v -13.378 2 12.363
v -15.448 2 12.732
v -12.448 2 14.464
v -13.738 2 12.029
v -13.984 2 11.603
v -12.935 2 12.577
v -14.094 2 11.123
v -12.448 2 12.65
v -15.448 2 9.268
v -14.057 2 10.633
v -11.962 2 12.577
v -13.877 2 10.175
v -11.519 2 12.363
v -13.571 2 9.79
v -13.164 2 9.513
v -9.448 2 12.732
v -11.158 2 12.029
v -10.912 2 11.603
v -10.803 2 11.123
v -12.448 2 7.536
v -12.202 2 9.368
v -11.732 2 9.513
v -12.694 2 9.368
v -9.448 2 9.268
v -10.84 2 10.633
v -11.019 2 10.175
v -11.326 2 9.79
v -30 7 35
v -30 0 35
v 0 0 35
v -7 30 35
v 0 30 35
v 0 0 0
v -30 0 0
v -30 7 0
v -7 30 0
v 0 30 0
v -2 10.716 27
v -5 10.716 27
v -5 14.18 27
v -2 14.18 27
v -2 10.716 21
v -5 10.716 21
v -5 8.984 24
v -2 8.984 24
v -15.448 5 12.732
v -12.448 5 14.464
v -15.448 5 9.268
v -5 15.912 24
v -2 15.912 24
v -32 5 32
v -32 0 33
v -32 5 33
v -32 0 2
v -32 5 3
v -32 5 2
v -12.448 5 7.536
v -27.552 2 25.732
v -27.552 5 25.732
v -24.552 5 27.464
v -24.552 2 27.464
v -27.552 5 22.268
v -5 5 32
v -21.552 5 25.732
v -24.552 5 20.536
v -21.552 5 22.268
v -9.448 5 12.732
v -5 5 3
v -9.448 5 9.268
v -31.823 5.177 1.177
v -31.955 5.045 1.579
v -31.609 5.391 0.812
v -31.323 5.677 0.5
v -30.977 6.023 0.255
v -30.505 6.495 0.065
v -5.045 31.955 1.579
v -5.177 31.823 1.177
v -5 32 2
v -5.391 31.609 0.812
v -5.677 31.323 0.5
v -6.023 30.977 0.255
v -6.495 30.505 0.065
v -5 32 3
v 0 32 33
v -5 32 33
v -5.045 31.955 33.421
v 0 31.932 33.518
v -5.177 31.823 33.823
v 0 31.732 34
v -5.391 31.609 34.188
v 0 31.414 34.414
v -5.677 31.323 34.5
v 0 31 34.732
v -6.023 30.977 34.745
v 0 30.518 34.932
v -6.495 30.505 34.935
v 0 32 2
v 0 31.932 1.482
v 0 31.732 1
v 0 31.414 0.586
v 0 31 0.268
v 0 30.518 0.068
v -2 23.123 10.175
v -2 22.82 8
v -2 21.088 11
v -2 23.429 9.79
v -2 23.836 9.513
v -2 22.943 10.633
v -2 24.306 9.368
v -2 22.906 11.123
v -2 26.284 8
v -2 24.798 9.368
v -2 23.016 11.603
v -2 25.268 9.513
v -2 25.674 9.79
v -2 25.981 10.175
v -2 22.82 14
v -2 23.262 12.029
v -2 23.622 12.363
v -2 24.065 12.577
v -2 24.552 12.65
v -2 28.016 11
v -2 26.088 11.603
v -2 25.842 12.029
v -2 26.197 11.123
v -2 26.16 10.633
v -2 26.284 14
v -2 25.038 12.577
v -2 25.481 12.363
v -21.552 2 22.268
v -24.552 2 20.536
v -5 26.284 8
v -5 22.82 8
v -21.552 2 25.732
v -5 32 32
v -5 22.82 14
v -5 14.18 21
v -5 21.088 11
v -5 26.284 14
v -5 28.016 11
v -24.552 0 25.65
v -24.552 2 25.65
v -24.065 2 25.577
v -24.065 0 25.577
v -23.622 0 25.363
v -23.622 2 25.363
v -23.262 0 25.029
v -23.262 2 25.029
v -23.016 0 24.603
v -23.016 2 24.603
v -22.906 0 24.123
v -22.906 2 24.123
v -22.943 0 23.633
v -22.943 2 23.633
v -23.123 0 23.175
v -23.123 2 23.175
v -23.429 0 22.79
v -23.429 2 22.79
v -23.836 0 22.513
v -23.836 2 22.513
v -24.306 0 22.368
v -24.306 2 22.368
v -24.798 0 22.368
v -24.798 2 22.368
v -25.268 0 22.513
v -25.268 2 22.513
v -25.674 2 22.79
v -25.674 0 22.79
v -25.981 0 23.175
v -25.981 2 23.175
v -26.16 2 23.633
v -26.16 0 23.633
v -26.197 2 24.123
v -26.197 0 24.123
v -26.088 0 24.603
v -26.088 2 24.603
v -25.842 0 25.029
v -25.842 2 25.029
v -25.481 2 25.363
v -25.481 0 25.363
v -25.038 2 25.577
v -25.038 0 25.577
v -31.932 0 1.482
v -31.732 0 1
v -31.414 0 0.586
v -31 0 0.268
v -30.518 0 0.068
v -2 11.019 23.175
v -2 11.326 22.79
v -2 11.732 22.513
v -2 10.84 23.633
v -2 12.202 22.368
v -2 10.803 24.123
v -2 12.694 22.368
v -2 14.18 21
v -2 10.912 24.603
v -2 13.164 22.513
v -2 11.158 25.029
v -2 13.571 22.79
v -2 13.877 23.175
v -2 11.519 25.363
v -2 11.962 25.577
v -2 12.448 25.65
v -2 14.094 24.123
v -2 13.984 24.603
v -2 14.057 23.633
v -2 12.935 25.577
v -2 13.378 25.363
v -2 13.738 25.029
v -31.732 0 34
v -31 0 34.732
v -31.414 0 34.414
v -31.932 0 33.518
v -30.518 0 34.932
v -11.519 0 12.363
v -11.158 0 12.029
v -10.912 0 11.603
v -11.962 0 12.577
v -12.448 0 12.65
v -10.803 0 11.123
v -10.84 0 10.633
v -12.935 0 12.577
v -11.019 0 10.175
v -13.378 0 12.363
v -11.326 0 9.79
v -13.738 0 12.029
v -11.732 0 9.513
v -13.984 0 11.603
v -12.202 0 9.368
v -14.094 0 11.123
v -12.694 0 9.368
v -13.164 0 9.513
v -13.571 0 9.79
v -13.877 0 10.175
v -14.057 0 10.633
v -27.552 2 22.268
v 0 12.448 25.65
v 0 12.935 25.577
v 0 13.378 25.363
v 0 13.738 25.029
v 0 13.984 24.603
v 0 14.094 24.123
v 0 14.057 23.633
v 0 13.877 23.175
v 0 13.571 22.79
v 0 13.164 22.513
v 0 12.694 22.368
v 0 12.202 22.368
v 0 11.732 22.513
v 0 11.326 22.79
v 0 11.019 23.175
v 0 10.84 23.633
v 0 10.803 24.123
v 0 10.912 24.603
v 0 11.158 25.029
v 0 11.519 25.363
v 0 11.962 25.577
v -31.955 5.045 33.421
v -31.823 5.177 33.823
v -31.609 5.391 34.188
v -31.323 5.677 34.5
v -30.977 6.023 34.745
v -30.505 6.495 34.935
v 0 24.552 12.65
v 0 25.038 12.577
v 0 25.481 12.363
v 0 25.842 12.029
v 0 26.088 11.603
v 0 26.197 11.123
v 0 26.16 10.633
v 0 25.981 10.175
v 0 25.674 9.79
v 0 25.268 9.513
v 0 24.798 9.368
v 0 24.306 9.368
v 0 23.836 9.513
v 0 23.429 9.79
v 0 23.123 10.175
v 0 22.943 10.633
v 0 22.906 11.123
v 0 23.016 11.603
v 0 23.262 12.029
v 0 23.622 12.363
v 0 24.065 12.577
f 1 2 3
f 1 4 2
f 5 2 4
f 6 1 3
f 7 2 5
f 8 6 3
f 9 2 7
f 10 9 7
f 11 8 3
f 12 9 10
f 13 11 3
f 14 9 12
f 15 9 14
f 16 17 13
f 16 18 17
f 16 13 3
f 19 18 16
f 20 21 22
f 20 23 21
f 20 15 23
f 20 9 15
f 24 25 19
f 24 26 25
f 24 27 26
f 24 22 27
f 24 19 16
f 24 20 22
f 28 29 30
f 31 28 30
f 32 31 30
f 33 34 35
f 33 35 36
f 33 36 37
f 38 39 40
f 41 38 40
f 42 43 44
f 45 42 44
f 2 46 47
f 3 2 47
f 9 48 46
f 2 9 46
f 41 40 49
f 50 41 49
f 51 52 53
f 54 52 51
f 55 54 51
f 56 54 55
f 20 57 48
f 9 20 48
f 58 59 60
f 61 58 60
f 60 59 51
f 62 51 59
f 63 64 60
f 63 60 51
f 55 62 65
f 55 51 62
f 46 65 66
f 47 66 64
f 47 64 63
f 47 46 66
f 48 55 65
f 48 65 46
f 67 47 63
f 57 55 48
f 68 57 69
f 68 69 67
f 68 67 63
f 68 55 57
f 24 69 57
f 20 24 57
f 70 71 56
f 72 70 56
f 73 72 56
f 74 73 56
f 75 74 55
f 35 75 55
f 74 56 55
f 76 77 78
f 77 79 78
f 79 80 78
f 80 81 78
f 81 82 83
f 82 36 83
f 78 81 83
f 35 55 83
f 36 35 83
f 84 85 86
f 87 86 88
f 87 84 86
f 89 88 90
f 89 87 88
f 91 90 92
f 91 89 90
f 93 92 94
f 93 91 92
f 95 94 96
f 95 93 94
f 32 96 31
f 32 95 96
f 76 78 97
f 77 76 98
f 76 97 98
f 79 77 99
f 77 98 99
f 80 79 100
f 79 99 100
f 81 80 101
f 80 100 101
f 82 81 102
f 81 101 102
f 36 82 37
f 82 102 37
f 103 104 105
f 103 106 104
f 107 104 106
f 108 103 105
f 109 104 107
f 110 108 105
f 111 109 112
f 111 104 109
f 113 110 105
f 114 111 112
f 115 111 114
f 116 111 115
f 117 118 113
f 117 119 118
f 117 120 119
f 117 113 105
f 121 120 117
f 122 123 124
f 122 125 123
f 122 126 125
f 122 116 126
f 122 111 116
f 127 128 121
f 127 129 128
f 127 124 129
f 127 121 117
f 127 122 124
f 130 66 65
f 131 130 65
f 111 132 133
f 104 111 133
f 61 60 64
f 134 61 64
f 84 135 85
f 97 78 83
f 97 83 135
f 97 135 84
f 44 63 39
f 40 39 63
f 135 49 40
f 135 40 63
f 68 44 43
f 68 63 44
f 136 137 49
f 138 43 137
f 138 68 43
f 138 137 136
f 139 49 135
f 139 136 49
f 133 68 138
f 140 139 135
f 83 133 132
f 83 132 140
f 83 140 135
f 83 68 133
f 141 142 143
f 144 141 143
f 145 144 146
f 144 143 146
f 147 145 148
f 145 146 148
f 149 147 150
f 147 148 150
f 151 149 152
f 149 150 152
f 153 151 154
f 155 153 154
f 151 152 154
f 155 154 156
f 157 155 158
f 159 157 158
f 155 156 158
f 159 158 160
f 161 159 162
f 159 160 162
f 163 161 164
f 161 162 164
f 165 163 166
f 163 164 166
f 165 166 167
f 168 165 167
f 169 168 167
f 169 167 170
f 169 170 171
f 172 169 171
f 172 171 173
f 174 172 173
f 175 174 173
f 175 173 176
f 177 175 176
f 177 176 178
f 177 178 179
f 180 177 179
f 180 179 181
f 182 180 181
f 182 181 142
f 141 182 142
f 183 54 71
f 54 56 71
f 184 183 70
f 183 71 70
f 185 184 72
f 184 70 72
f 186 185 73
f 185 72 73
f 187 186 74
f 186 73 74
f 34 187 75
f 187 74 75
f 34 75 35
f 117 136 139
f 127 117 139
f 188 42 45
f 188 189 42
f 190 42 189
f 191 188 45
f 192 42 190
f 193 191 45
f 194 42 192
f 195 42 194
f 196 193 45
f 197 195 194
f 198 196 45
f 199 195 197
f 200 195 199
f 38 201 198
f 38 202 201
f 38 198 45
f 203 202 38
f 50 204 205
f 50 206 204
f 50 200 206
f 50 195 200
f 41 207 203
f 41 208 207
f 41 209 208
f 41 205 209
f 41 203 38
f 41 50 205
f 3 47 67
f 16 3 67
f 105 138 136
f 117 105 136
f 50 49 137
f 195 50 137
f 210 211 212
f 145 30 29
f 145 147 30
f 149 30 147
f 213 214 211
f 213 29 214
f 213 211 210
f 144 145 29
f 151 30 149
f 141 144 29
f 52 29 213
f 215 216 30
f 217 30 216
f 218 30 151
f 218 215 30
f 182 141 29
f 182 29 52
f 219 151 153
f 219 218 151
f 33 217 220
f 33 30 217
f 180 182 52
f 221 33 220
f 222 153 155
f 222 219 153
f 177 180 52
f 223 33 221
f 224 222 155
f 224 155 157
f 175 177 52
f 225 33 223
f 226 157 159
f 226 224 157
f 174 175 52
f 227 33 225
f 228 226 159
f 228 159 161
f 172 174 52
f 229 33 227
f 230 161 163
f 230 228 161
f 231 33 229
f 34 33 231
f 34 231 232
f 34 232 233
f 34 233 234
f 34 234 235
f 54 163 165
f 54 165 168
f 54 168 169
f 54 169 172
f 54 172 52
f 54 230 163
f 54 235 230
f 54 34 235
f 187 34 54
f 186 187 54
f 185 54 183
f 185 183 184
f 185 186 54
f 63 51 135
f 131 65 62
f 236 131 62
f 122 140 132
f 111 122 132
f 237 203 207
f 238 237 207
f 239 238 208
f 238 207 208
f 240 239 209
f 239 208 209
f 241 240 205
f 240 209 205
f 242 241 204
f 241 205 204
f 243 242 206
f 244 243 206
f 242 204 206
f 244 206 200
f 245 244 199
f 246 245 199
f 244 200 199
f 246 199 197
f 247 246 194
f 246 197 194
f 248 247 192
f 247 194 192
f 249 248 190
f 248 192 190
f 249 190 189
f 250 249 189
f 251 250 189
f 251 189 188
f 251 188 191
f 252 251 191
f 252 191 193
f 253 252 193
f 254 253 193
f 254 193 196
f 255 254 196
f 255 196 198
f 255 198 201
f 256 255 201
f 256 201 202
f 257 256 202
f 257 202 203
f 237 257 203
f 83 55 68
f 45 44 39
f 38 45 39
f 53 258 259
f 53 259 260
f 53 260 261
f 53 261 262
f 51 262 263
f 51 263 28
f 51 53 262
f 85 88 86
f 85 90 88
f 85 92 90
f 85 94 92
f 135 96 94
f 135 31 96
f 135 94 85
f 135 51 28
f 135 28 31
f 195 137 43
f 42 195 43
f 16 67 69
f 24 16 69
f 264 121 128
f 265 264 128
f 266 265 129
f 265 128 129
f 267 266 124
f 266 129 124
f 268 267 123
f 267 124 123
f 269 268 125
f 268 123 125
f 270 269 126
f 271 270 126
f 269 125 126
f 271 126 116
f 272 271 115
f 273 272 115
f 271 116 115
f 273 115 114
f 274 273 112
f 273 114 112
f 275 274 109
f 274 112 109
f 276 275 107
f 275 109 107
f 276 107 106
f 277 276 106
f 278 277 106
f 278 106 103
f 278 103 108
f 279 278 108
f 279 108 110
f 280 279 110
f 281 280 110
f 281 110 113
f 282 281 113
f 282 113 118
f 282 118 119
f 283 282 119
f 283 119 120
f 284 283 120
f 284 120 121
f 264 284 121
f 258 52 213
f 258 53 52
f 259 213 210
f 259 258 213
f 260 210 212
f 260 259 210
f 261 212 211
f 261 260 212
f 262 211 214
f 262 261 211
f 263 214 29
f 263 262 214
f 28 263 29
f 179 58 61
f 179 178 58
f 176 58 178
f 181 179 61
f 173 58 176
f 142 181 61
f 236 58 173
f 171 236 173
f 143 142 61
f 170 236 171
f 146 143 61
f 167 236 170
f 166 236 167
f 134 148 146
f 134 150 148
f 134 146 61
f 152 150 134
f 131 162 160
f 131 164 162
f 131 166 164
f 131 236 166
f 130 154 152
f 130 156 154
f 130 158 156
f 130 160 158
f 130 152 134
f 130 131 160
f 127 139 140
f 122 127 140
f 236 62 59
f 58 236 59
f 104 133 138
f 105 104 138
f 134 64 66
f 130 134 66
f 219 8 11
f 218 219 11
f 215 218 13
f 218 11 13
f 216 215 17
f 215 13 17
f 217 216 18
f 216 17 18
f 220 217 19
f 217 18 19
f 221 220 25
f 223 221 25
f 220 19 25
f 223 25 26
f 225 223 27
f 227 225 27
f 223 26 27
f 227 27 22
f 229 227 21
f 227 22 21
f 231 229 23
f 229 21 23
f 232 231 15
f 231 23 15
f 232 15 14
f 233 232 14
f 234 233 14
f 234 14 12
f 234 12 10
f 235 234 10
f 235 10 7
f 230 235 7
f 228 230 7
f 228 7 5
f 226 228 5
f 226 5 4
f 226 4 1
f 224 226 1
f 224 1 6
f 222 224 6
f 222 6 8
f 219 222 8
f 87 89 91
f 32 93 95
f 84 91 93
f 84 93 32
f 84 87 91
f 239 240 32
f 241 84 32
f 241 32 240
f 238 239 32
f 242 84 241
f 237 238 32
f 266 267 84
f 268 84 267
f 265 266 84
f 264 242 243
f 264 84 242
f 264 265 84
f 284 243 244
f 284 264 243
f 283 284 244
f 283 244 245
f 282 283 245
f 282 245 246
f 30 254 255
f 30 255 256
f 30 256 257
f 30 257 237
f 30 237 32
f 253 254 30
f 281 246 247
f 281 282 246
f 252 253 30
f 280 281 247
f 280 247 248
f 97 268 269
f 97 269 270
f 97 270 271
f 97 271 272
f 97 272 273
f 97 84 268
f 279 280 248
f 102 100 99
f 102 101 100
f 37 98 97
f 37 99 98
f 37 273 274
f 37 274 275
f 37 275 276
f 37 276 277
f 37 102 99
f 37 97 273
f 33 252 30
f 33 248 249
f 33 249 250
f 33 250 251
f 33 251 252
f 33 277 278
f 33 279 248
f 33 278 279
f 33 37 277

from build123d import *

# Parameters (mm, degrees)
EXTRUDE_1_DEPTH     = 35
RIB_1_REACH         = 59.21
SKETCH_3_WALL_W     = 154.604044108
SKETCH_3_WALL_H     = 3
CUT_EXTRUDE_1_DEPTH = 3
SKETCH_6_R          = 1.65
CUT_EXTRUDE_2_DEPTH = 8
CUT_EXTRUDE_3_DEPTH = 3
SKETCH_8_R          = 1.65
CUT_EXTRUDE_4_DEPTH = 10
FILLET_1_R          = 2


with BuildPart() as part:
    # Эскиз1 → Бобышка-Вытянуть1 (new body)
    with BuildSketch(Plane.XY):
        Polygon((0, 0), (-32, 0), (-32, 5), (-5, 5), (-5, 32), (0, 32), align=None)
    extrude(amount=EXTRUDE_1_DEPTH)

    # Эскиз3 wall → Ребро1 (add, up to next)
    with BuildSketch(Plane(origin=(-18.5, 18.5, 35), x_dir=(0.707106781187, 0.707106781187, 0), z_dir=(-0.707106781187, 0.707106781187, 0)), mode=Mode.PRIVATE) as rib_1_sk1:
        with Locations((0, 1.5)):
            Rectangle(SKETCH_3_WALL_W, SKETCH_3_WALL_H)
    rib_1_tool1 = extrude(rib_1_sk1.sketch, amount=-RIB_1_REACH, mode=Mode.PRIVATE) - part.part
    rib_1 = rib_1_tool1.solids().sort_by_distance((-18.5, 18.5, 35))[0]
    add(rib_1)

    # Зеркальное отражение1: Ребро1 across plane
    add(rib_1.mirror(Plane.XY.offset(17.5)))

    # Эскиз5 → Вырез-Вытянуть1 (cut)
    with BuildSketch(Plane.ZY.offset(5)):
        Polygon((24, 8.984174247), (27, 10.716225055), (27, 14.18032667), (24, 15.912377477), (21, 14.18032667), (21, 10.716225055), align=None)
        Polygon((11, 21.087622523), (14, 22.81967333), (14, 26.283774945), (11, 28.015825753), (8, 26.283774945), (8, 22.81967333), align=None)
    extrude(amount=-CUT_EXTRUDE_1_DEPTH, mode=Mode.SUBTRACT)

    # Эскиз6 → Вырез-Вытянуть2 (cut)
    with BuildSketch(Plane.ZY.offset(2)):
        with Locations((11, 24.551724138)):
            Circle(SKETCH_6_R)
        with Locations((24, 12.448275862)):
            Circle(SKETCH_6_R)
    extrude(amount=-CUT_EXTRUDE_2_DEPTH, mode=Mode.SUBTRACT)

    # Эскиз7 → Вырез-Вытянуть3 (cut)
    with BuildSketch(Plane(origin=(0, 5, 0), x_dir=(1, 0, 0), z_dir=(0, 1, 0))):
        Polygon((-24.551724138, -20.535898385), (-27.551724138, -22.267949192), (-27.551724138, -25.732050808), (-24.551724138, -27.464101615), (-21.551724138, -25.732050808), (-21.551724138, -22.267949192), align=None)
        Polygon((-12.448275862, -7.535898385), (-15.448275862, -9.267949192), (-15.448275862, -12.732050808), (-12.448275862, -14.464101615), (-9.448275862, -12.732050808), (-9.448275862, -9.267949192), align=None)
    extrude(amount=-CUT_EXTRUDE_3_DEPTH, mode=Mode.SUBTRACT)

    # Эскиз8 → Вырез-Вытянуть4 (cut)
    with BuildSketch(Plane(origin=(0, 2, 0), x_dir=(1, 0, 0), z_dir=(0, 1, 0))):
        with Locations(Location((-24.551724138, -24, 0), (0, 0, 270))):
            Circle(SKETCH_8_R)
        with Locations(Location((-12.448275862, -11, 0), (0, 0, 270))):
            Circle(SKETCH_8_R)
    extrude(amount=-CUT_EXTRUDE_4_DEPTH, mode=Mode.SUBTRACT)

    # Скругление1
    fillet_1_edges = [part.edges().sort_by_distance(p)[0] for p in [
        (-32, 2.5, 35),
        (-32, 2.5, 0),
        (-2.5, 32, 0),
        (-2.5, 32, 35),
    ]]
    fillet(fillet_1_edges, radius=FILLET_1_R)


solid = part.part
